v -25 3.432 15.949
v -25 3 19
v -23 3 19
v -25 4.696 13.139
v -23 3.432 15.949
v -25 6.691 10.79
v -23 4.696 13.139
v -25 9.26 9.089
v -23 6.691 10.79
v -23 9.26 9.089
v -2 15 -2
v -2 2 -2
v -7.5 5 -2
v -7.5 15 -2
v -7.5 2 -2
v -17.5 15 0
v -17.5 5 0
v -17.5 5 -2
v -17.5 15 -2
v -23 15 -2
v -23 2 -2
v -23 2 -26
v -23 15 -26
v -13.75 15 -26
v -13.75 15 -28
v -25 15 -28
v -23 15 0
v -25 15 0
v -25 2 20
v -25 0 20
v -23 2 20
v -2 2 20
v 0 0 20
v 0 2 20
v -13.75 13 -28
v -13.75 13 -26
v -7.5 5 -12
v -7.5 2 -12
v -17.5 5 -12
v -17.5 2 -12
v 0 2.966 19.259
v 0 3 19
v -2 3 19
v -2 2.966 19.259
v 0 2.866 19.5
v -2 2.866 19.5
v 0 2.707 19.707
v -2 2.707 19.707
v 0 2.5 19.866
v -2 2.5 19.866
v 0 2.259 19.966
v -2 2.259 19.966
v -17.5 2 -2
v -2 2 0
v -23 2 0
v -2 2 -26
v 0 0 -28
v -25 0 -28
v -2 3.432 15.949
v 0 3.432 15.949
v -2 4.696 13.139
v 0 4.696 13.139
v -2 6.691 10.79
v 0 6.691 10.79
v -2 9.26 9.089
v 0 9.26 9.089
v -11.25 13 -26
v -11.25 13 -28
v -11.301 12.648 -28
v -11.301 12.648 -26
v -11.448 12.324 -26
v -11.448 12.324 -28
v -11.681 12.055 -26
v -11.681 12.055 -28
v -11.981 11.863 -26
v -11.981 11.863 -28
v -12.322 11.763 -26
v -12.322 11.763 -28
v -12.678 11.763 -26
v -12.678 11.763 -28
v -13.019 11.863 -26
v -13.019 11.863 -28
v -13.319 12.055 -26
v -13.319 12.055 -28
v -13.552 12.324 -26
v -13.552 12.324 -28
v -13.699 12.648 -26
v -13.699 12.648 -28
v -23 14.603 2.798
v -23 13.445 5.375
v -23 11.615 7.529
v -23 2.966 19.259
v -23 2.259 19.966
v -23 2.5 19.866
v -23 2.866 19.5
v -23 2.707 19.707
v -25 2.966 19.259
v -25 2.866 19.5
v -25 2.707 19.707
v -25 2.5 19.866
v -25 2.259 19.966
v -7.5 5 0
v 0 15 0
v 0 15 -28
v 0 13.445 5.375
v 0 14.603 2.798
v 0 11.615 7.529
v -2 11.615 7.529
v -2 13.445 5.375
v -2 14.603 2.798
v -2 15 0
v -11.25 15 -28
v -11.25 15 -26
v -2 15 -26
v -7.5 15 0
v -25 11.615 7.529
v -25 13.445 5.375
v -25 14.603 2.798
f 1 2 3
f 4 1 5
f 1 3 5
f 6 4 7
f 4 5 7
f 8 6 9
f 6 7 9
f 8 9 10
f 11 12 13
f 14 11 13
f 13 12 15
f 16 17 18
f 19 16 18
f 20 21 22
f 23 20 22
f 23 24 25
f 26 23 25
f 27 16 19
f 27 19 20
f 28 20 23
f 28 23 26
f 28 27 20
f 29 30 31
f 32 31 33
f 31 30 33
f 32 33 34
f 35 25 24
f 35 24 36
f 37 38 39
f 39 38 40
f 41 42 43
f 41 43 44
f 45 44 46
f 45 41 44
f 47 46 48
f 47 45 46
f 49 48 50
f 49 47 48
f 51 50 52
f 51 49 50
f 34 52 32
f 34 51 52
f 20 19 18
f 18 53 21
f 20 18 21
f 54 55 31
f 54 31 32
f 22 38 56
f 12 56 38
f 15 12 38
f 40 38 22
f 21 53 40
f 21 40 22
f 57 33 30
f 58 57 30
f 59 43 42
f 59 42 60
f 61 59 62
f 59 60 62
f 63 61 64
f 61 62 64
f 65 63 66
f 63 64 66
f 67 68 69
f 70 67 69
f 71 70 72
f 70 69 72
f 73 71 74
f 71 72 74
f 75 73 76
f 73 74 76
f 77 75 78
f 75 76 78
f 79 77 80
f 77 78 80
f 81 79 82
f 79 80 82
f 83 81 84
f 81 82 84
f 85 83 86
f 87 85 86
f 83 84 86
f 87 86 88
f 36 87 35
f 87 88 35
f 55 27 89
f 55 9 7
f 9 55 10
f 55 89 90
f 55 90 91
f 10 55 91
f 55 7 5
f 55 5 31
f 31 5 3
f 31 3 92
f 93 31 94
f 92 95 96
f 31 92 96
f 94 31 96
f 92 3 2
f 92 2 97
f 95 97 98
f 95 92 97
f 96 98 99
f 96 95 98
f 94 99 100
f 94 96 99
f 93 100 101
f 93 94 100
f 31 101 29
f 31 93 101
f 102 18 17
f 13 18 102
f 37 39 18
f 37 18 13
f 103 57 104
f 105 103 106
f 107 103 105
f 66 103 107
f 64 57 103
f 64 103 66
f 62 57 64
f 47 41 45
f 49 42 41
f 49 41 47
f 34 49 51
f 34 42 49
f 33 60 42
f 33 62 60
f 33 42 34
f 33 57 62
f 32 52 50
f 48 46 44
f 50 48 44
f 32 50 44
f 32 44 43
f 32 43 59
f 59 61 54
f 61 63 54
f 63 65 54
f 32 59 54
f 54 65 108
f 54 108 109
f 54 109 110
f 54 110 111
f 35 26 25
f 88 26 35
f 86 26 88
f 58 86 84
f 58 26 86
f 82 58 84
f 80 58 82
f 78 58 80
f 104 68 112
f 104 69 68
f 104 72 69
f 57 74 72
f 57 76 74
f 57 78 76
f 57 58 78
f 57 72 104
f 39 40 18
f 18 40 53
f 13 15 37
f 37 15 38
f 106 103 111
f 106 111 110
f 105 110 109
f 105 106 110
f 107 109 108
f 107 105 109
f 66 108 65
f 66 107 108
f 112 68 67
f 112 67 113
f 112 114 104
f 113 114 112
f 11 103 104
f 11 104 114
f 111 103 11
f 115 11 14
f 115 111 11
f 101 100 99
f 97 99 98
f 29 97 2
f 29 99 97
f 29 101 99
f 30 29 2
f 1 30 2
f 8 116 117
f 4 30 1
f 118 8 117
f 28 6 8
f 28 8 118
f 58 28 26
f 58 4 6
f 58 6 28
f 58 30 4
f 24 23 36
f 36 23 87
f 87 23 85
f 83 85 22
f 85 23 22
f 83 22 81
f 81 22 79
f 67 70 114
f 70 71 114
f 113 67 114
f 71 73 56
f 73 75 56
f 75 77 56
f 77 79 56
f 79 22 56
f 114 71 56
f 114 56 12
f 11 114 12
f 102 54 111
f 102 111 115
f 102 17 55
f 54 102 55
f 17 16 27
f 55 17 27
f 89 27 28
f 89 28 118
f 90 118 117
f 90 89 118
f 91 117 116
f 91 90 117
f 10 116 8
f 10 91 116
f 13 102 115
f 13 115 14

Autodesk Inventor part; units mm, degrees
ref_plane "YZ Plane" through (0, 0, 0) normal (1, 0, 0) x (0, 1, 0)
ref_plane "XZ Plane" through (0, 0, 0) normal (0, 1, 0) x (-1, 0, 0)
ref_plane "XY Plane" through (0, 0, 0) normal (0, 0, 1) x (1, 0, 0)
sketch "Sketch1" plane through (0, 0, 0) normal (0, 1, 0) x (-1, 0, 0)
  line L0 (0, 0) -> (25, 0)
  line L1 (25, 0) -> (25, -28)
  line L2 (25, -28) -> (0, -28)
  line L3 (0, -28) -> (0, 0)
  dimension "d0" = 25
  dimension "d1" = 28
extrude "Extrusion1" add sketch "Sketch1" along normal blind 15
sketch "Sketch2" plane through (0, 15, 0) normal (0, 1, 0) x (1, 0, 0)
  point P0 (0, 0)
shell "Shell1" thickness 2 removed faces 1 at (-8.3333, 15, -9.3333)
sketch "Sketch3" plane through (0, 0, 0) normal (1, 0, 0) x (0, 0, -1)
  point P0 (0, 0)
sketch "Sketch4" plane through (0, 0, 0) normal (1, 0, 0) x (0, 0, -1)
  line L0 (0, 0) -> (0, 15) projected
  line L1 (0, 15) -> (0, 0)
  line L2 (0, 0) -> (-20, 0)
  line L3 (-20, 0) -> (-20, 2)
  arc A0 (-19, 3) -> (-20, 2) centre (-19, 2) ccw
  arc A1 (-19, 3) -> (-9.089, 9.2596) centre (-19, 13.976) ccw
  line L4 (28, 15) -> (0, 15) projected
  arc A2 (0, 15) -> (-9.089, 9.2596) centre (0, 4.9343) ccw
  line L5 (0, 15) -> (28, 15) projected
  dimension "d5" = 20
  dimension "d6" = 2
  dimension "d7" = 1
extrude "Extrusion2" add sketch "Sketch4" against normal blind 25
sketch "Sketch5" plane through (0, 0, -28) normal (0, 0, -1) x (-1, 0, 0)
  circle A0 centre (12.5, 13) radius 1.25
  line L0 (11.25, 13) -> (11.25, 15)
  line L1 (0, 15) -> (25, 15) projected
  line L2 (11.25, 15) -> (13.75, 15)
  line L3 (13.75, 15) -> (13.75, 13)
  point P0 (0, 0)
  dimension "d10" = 2.5
sketch "Sketch6" plane through (0, 0, -28) normal (0, 0, -1) x (-1, 0, 0)
  point P0 (0, 0)
extrude "Extrusion3" cut sketch "Sketch5" against normal up to next
sketch "Sketch7" plane through (-23, 2, -2) normal (0, 1, 0) x (1, 0, 0)
  point P0 (23, -2)
sketch "Sketch8" plane through (0, 15, 0) normal (0, 1, 0) x (1, 0, 0)
  line L0 (-2, 0) -> (-23, 0)
  line L1 (-23, 0) -> (-23, -20)
  line L2 (-23, -20) -> (-2, -20)
  line L3 (-2, -20) -> (-2, 0)
  line L4 (-12.5, 0) -> (-7.5, 0)
  line L5 (-7.5, 0) -> (-7.5, 2)
  line L6 (-7.5, 2) -> (-12.5, 2)
  line L7 (-12.5, 2) -> (-12.5, 0)
  line L8 (-12.5, 0) -> (-17.5, 0)
  line L9 (-17.5, 0) -> (-17.5, 2)
  line L10 (-17.5, 2) -> (-12.5, 2)
  line L11 (-12.5, 2) -> (-12.5, 0)
  point P0 (0, 0)
  dimension "d13" = 21
  dimension "d14" = 20
  dimension "d15" = 5
  dimension "d16" = 2
  dimension "d17" = 5
  dimension "d18" = 2
extrude "Extrusion4" cut sketch "Sketch8" against normal up to surface (13 mm away) contours L3 L2 L1 L0
extrude "Extrusion5" cut sketch "Sketch8" against normal blind 10 contours L0 L7 L6 L5 | L0 L9 L10 L7
sketch "Sketch9" plane through (-23, 2, -2) normal (0, 1, 0) x (1, 0, 0)
  line L0 (5.5, 0) -> (15.5, 0) projected
  line L1 (5.5, 0) -> (15.5, 0)
  line L2 (15.5, 0) -> (15.5, 10)
  line L3 (15.5, 10) -> (5.5, 10)
  line L4 (5.5, 10) -> (5.5, 0)
  point P0 (23, -2)
  dimension "d23" = 10
  dimension "d24" = 10
extrude "Extrusion6" add sketch "Sketch9" along normal up to surface (3 mm away)
properties part number "Holster"
